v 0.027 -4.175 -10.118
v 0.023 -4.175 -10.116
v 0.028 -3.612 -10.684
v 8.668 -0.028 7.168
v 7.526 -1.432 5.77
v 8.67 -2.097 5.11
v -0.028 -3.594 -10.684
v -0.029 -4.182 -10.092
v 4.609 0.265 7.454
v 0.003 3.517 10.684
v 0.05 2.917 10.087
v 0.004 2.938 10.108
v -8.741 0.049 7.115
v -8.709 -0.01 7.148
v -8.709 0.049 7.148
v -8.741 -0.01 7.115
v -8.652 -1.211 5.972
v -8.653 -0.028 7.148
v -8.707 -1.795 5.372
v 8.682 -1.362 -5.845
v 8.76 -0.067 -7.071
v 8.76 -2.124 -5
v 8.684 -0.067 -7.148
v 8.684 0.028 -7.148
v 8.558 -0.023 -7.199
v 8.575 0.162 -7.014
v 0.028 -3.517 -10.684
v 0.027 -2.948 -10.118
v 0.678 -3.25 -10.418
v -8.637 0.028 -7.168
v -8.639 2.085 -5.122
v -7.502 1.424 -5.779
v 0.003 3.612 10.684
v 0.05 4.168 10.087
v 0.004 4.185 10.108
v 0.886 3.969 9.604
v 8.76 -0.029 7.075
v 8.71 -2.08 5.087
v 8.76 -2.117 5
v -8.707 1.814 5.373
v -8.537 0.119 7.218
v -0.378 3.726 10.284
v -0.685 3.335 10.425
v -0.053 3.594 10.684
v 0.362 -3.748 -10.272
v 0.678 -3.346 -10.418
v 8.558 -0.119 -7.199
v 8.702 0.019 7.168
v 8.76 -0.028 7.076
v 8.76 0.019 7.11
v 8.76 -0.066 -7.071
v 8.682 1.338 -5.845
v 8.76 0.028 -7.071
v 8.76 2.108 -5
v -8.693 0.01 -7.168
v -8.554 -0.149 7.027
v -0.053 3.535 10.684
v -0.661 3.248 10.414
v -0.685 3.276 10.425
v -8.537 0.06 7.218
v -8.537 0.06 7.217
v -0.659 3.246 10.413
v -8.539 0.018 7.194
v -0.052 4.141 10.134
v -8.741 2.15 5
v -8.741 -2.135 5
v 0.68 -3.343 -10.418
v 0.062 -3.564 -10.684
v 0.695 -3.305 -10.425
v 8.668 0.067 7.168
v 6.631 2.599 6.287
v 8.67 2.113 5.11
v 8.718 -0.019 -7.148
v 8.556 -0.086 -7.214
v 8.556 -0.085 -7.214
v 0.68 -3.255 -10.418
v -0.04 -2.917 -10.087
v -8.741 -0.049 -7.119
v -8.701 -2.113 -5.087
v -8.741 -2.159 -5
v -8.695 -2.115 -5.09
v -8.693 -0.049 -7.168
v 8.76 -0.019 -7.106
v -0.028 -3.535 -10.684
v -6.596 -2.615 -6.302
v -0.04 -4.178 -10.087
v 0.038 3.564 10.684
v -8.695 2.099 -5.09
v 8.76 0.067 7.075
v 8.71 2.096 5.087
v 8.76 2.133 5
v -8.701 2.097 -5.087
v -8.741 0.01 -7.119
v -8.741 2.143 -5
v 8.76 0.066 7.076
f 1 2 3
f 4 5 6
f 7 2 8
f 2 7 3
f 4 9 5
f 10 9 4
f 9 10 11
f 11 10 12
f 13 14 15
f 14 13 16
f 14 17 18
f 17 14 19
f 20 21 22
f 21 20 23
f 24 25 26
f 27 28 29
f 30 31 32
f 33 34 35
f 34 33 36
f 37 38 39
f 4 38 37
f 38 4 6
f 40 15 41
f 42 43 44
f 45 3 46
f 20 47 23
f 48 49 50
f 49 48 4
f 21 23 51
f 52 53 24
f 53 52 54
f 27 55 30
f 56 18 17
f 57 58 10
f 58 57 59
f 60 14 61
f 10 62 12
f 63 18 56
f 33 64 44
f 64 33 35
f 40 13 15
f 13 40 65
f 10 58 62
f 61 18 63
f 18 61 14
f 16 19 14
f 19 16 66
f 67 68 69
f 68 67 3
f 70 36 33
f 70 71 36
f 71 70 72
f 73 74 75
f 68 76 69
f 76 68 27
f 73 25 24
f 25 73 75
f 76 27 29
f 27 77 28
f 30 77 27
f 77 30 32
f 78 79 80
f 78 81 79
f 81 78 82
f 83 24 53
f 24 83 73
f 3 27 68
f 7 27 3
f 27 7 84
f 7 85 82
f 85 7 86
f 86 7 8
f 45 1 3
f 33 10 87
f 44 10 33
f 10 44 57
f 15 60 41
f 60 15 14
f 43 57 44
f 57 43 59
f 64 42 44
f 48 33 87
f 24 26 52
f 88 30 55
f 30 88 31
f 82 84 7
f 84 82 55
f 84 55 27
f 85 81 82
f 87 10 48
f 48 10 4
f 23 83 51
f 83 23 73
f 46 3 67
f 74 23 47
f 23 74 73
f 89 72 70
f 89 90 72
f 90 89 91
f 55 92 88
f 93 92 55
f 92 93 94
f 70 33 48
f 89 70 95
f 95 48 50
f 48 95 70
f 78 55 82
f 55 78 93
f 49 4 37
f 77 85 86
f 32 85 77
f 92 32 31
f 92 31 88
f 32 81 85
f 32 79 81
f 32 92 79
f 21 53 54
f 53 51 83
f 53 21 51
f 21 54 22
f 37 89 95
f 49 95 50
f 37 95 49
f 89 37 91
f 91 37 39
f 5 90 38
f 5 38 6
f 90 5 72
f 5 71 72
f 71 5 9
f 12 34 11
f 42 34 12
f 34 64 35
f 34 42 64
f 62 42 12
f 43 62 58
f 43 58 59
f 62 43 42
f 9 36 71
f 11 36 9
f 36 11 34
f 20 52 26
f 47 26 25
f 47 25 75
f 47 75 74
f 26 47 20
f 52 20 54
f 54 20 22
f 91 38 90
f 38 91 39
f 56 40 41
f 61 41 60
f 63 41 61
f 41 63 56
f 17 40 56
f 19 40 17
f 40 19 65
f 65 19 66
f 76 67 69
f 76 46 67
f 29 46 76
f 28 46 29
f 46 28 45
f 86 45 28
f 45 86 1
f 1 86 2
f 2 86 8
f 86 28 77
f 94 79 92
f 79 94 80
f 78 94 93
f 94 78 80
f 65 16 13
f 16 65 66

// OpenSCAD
// Auto-generated OpenSCAD file

    inner_points = 10*[[0.8660275601949093, -0.49999626496864946, -0.5000000000002527], [0.8660232473576305, 0.5000037350220502, -0.5000000000001439], [2.1564184105024137e-06, -0.49999999999524114, -1.0000000000000544], [-2.156418868470349e-06, 0.4999999999954585, -0.9999999999999456], [2.156418868470349e-06, -0.4999999999954585, 0.9999999999999456], [-2.1564184105024137e-06, 0.49999999999524114, 1.0000000000000544], [-0.8660232473576305, -0.5000037350220502, 0.5000000000001439], [-0.8660275601949093, 0.49999626496864946, 0.5000000000002527], [0.8660275601951383, -0.49999626496875815, 0.49999999999974737], [0.8660232473578595, 0.5000037350219414, 0.4999999999998561], [-0.8660232473578595, -0.5000037350219414, -0.4999999999998561], [-0.8660275601951383, 0.49999626496875815, -0.49999999999974737], [0.7865660924778658, 3.3923317141515653e-06, -1.3623724356959748], [-0.7865660924778658, -3.3923317141515653e-06, 1.3623724356959748]];

    outer_points = 10*[[0.8668436236259911, -0.0019279514490723182, -0.7061008534070546], [0.8660225906704068, -0.707104152868027, 0.002930775546985575], [0.866027055663365, 0.707104152868027, -0.0009251247660098337], [0.8652060227077807, 0.0019279514490723182, 0.7081065041880305], [-0.8652060227077807, -0.0019279514490723182, -0.7081065041880305], [-0.866027055663365, -0.707104152868027, 0.0009251247660098337], [-0.8660225906704068, 0.707104152868027, -0.002930775546985575], [-0.8668436236259911, 0.0019279514490723182, 0.7061008534070546], [0.0012270844404182679, -0.35644400360762196, -1.0596915431180651], [0.0004060514848339595, -1.0616202050265766, -0.3506599141640247], [-0.0004060514848339595, 1.0616202050265766, 0.3506599141640247], [-0.0012270844404182679, 0.35644400360762196, 1.0596915431180651], [1.573131130281187, 0.0, 0.0018216288930887289], [-1.573131130281187, 0.0, -0.0018216288930887289]];

    // Convex hull for inner set (I)
    module inner_hull() {
        hull() {
            for (p = inner_points) {
                translate(p) sphere(r=0.1);
            }
        }
    }

    // Convex hull for outer set (O) minus inner hull (O \ I)
    module outer_minus_inner() {
        difference() {
            hull() {
                for (p = outer_points) {
                    translate(p) sphere(r=0.1);
                }
            }
            inner_hull(); // Subtract inner hull
        }
    }

    // Convex hull for outer set (O) minus all translated inner hulls
    module outer_minus_AllTranslationInner() {
        difference() {
            hull() {
                for (p = outer_points) {
                    translate(p) sphere(r=0.1);
                }
            }
            hull() {
                translate([0,0,50]) inner_hull();
                translate([0,0,-50]) inner_hull();
            }; // Subtract translated inner hulls
        }
    }

    // Difference between outer_minus_inner and outer_minus_AllTranslationInner
    module outer_minus_inner_diff() {
        difference() {
            // Outer minus inner
            difference() {
                hull() {
                    for (p = outer_points) {
                        translate(p) sphere(r=0.1);
                    }
                }
                inner_hull();
            }

            // Subtract Outer minus AllTranslationInner
            difference() {
                hull() {
                    for (p = outer_points) {
                        translate(p) sphere(r=0.1);
                    }
                }
                hull() {
                    translate([0,0,50]) inner_hull();
                    translate([0,0,-50]) inner_hull();
                };
            }
        }
    }

    // Rendering all with colors applied
    color([1, 1, 0, 1]) outer_minus_inner_diff(); // Opaque yellow
    
